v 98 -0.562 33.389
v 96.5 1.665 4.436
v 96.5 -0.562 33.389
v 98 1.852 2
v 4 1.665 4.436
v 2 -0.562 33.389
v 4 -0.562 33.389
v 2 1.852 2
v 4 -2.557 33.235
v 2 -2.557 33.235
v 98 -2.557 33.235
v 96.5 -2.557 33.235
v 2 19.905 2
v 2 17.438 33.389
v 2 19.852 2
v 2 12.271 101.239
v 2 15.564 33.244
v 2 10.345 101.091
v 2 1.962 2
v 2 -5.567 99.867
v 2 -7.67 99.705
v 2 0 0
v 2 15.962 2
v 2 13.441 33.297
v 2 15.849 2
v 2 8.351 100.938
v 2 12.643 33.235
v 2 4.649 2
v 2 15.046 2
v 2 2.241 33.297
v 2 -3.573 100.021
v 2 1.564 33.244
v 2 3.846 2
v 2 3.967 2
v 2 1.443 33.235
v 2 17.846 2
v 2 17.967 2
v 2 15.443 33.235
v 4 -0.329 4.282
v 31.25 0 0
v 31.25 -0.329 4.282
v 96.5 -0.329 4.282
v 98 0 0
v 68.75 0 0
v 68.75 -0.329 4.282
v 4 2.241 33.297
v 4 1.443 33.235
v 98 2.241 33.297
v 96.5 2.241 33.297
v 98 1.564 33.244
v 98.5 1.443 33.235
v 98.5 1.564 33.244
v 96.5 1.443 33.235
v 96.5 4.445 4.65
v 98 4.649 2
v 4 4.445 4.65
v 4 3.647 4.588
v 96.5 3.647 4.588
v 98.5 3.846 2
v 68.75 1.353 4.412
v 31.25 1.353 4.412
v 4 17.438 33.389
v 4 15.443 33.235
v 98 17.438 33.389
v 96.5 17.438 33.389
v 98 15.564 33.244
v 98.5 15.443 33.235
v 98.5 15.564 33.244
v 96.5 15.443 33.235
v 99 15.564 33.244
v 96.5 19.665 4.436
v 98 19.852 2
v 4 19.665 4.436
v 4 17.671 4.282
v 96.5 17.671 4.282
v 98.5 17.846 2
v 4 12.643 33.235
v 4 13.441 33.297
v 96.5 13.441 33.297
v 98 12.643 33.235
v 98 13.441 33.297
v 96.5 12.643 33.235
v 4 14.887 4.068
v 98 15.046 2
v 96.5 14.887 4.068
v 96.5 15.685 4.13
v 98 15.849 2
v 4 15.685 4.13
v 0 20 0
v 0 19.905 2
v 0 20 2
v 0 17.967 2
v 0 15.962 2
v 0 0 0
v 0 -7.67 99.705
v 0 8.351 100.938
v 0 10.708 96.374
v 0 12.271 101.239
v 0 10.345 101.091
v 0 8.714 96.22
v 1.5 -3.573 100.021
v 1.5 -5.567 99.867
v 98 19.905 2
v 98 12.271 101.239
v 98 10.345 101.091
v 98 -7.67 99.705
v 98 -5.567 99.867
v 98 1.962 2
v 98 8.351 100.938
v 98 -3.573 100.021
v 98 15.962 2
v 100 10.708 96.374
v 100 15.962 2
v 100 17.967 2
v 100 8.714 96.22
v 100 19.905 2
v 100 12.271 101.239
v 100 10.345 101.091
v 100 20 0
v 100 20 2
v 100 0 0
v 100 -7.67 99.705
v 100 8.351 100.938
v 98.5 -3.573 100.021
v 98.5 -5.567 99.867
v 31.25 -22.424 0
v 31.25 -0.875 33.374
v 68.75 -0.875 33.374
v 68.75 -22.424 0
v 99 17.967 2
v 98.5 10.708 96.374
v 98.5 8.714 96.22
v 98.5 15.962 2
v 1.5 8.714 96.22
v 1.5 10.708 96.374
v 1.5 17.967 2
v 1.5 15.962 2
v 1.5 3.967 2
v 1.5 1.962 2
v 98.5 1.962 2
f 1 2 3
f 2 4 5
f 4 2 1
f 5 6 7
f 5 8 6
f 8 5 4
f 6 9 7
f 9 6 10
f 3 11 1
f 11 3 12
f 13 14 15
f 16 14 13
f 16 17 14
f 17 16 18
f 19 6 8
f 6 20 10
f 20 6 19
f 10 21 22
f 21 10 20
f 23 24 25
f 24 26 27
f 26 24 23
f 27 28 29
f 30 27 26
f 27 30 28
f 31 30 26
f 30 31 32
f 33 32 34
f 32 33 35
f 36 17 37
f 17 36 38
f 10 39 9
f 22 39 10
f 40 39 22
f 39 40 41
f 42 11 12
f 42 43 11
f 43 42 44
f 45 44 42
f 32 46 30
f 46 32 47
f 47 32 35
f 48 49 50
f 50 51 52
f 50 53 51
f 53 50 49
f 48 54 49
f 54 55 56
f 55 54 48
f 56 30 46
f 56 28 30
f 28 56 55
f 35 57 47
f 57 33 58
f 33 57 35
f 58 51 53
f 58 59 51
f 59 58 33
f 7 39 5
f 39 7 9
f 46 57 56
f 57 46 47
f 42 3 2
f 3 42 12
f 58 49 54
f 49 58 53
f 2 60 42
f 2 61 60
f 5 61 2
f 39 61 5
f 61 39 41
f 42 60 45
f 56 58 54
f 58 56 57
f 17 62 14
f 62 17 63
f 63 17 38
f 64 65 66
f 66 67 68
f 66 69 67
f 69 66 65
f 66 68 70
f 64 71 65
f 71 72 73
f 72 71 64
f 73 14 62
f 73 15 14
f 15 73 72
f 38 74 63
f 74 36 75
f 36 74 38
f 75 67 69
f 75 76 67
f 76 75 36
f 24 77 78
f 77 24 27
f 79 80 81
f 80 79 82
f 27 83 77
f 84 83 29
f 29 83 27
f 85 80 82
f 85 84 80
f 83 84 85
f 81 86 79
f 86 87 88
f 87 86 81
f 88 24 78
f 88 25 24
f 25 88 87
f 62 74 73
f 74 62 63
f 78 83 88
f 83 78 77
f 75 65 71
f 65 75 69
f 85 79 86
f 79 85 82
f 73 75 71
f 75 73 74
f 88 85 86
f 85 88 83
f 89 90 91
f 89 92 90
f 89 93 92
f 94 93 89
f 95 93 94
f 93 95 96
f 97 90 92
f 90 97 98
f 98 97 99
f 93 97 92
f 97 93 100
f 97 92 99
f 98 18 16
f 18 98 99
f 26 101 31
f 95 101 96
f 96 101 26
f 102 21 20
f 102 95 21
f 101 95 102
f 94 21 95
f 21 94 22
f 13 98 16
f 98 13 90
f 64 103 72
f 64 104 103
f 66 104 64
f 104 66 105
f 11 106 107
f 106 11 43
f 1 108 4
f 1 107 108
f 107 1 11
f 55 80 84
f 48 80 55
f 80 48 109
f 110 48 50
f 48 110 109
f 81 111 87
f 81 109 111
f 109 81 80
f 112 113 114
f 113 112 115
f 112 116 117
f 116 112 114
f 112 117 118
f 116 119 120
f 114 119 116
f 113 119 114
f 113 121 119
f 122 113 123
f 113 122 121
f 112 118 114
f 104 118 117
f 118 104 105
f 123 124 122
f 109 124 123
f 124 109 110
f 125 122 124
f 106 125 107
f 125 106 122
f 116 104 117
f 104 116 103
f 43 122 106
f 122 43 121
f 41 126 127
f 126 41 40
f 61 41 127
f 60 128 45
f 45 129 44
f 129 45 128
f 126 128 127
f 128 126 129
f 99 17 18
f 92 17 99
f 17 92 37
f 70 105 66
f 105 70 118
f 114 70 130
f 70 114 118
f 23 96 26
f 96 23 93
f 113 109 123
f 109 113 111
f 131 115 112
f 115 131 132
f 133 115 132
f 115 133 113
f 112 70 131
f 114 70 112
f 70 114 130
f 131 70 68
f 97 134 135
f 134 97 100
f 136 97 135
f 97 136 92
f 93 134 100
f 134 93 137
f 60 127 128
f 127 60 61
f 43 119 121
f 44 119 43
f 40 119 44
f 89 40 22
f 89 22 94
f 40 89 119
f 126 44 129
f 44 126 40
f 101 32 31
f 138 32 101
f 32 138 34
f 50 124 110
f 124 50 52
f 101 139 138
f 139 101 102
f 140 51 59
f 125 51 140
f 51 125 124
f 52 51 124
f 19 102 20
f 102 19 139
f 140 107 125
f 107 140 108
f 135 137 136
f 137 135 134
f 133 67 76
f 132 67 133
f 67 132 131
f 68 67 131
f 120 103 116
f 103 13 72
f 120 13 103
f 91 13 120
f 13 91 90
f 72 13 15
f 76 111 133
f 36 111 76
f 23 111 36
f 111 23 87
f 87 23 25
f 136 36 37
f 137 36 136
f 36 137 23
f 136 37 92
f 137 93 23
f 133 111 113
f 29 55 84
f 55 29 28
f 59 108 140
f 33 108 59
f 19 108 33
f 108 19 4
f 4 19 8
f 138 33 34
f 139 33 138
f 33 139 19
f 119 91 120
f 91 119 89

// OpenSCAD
breadth = 100;
depth = 20;

height = breadth;
wall = 2;
slope = 4.3987;

notch = wall/4;
hook = 5;
slot = wall;
slath = height/3;
thin = 0.8;
give = .4;

buttspan = .1875 * breadth * 4;
butttail = 1.4 * depth * 2;
buttslope = 1.27*45;

union() {
    cube([breadth,depth,wall]);

    
difference() {
union() {
    translate([wall,0,0]) rotate([slope,0,0]) cube([breadth-(wall-notch)*2,slot,slath]);
    
    translate([wall,wall*2,0]) rotate([slope,0,0]) cube([breadth-(wall-notch)*2,thin,slath]);
    }

    translate([0,-wall*2,wall*2]) translate([wall*2,0,0]) rotate([slope,0,0]) color([0.7,0.3,0.3]) cube([breadth-(wall-notch)*5,wall*5,slath-wall]);
}
    
    

difference() {
union() {
    translate([wall,depth-wall,0]) rotate([slope,0,0]) cube([breadth-(wall-notch)*2,slot,slath]);
    
    translate([wall,depth-wall*2-thin,0]) rotate([slope,0,0]) cube([breadth-(wall-notch)*2,thin,slath]);   
    
    }
    
    translate([0,-wall*2,wall*2]) translate([wall*2,depth-wall,0]) rotate([slope,0,0]) color([0.7,0.3,0.3]) cube([breadth-(wall-notch)*5,wall*3,slath-wall]);
}

        
    
difference() {
    union() { 

        rotate([slope,0,0]) cube([wall,depth,height]);
        translate([breadth-wall,0,0]) rotate([slope,0,0]) cube([wall,depth,height]);

        translate([breadth/2-buttspan/4,butttail/3,-butttail*sqrt(2)/2]) rotate([buttslope,0,0]) color([1,0,0]) cube([buttspan/2,butttail,butttail]);
    }
    
    translate([breadth/2-buttspan/2,wall,-wall*2]) color([0,.5,.5]) rotate([slope,0,0]) cube(buttspan, butttail, butttail);
   
    translate([breadth/2-buttspan/2,-buttspan/1.25,-buttspan*1.5]) color([0,.5,.5]) cube([buttspan, buttspan*1.5,buttspan*1.5]);
    
    translate([wall-notch,wall,wall-notch]) color([0,0,1]) rotate([slope,0,0]) cube([breadth-(wall-notch)*2,slot,height]);
    
    translate([wall-notch,depth-wall*2,wall-notch]) color([0,0,1]) rotate([slope,0,0]) cube([breadth-(wall-notch)*2,slot,height]);    
 
    difference() {   
    translate([wall+wall,depth-wall*2,wall-notch]) color([0,0,1]) rotate([slope,0,0]) cube([breadth-(wall-notch)*2,slot,height]);    
 
    translate([wall+wall,depth-wall*2,wall-notch]) color([0,0,1]) rotate([slope,0,0]) cube([breadth-(wall-notch)*2,slot,height-hook]);    
    }
    
    difference() {
    translate([0,depth-wall*2,wall-notch]) color([0,0,1]) rotate([slope,0,0]) cube([breadth-(wall-notch)*2,wall,height]);  
  
    translate([0,depth-wall*2,wall-notch]) color([0,0,1]) rotate([slope,0,0]) cube([breadth-(wall-notch)*2,wall,height-hook]);   
    }
    
}

}

length = breadth-(wall-notch+give)*2;

*render() {
translate([breadth*1.5,height*2,0]) { 

sten = "hacktower.png";
stenw = 202;
stenh = 599;
tower = length/stenw*stenh;
scale = tower/stenh*.95;
grays = 1/256;
hollow = wall-1.5;
    
echo(hollow);
    union()    {
    difference() {
        rotate([90,0,0]) color([0,1,0]) cube([length,slot-give,tower]);

        translate([breadth-breadth*.975,-tower*.975,wall-hollow+1]) scale([scale,scale,grays*wall*slot*2]) surface(file=sten, invert=true); 
    }
    
    for(i = [18:20:tower*.8]) {
    translate([i<tower*.6?0:length*.3,i-tower,0]) color([.5,0,.5]) cube([i<tower*.6?length:(length*.4), thin, thin]);
    }
    
    translate([0,25-tower,0]) color([.5,0,.5]) cube([length, thin, thin]);
    
    translate([length/2+.5,-tower*.341,0]) color([.5,0,.5]) cube([thin,15,thin]);
}
}
}

*render() {
translate([0,depth*4,0]) { 

sten = "test.png";
stenw = 400;
stenh = 400;
scale = slath/stenh*.9;
grays = 1/256;
hollow = wall-1.5;
echo(hollow);

    difference() {
        rotate([90,0,0]) color([0,1,0]) cube([length,slot-give,slath]);

        translate([length/2-stenh*scale/2,-slath*.95,wall-hollow+1]) scale([scale,scale,grays*wall*slot*2]) surface(file=sten, invert=true); 
    }
}
}
